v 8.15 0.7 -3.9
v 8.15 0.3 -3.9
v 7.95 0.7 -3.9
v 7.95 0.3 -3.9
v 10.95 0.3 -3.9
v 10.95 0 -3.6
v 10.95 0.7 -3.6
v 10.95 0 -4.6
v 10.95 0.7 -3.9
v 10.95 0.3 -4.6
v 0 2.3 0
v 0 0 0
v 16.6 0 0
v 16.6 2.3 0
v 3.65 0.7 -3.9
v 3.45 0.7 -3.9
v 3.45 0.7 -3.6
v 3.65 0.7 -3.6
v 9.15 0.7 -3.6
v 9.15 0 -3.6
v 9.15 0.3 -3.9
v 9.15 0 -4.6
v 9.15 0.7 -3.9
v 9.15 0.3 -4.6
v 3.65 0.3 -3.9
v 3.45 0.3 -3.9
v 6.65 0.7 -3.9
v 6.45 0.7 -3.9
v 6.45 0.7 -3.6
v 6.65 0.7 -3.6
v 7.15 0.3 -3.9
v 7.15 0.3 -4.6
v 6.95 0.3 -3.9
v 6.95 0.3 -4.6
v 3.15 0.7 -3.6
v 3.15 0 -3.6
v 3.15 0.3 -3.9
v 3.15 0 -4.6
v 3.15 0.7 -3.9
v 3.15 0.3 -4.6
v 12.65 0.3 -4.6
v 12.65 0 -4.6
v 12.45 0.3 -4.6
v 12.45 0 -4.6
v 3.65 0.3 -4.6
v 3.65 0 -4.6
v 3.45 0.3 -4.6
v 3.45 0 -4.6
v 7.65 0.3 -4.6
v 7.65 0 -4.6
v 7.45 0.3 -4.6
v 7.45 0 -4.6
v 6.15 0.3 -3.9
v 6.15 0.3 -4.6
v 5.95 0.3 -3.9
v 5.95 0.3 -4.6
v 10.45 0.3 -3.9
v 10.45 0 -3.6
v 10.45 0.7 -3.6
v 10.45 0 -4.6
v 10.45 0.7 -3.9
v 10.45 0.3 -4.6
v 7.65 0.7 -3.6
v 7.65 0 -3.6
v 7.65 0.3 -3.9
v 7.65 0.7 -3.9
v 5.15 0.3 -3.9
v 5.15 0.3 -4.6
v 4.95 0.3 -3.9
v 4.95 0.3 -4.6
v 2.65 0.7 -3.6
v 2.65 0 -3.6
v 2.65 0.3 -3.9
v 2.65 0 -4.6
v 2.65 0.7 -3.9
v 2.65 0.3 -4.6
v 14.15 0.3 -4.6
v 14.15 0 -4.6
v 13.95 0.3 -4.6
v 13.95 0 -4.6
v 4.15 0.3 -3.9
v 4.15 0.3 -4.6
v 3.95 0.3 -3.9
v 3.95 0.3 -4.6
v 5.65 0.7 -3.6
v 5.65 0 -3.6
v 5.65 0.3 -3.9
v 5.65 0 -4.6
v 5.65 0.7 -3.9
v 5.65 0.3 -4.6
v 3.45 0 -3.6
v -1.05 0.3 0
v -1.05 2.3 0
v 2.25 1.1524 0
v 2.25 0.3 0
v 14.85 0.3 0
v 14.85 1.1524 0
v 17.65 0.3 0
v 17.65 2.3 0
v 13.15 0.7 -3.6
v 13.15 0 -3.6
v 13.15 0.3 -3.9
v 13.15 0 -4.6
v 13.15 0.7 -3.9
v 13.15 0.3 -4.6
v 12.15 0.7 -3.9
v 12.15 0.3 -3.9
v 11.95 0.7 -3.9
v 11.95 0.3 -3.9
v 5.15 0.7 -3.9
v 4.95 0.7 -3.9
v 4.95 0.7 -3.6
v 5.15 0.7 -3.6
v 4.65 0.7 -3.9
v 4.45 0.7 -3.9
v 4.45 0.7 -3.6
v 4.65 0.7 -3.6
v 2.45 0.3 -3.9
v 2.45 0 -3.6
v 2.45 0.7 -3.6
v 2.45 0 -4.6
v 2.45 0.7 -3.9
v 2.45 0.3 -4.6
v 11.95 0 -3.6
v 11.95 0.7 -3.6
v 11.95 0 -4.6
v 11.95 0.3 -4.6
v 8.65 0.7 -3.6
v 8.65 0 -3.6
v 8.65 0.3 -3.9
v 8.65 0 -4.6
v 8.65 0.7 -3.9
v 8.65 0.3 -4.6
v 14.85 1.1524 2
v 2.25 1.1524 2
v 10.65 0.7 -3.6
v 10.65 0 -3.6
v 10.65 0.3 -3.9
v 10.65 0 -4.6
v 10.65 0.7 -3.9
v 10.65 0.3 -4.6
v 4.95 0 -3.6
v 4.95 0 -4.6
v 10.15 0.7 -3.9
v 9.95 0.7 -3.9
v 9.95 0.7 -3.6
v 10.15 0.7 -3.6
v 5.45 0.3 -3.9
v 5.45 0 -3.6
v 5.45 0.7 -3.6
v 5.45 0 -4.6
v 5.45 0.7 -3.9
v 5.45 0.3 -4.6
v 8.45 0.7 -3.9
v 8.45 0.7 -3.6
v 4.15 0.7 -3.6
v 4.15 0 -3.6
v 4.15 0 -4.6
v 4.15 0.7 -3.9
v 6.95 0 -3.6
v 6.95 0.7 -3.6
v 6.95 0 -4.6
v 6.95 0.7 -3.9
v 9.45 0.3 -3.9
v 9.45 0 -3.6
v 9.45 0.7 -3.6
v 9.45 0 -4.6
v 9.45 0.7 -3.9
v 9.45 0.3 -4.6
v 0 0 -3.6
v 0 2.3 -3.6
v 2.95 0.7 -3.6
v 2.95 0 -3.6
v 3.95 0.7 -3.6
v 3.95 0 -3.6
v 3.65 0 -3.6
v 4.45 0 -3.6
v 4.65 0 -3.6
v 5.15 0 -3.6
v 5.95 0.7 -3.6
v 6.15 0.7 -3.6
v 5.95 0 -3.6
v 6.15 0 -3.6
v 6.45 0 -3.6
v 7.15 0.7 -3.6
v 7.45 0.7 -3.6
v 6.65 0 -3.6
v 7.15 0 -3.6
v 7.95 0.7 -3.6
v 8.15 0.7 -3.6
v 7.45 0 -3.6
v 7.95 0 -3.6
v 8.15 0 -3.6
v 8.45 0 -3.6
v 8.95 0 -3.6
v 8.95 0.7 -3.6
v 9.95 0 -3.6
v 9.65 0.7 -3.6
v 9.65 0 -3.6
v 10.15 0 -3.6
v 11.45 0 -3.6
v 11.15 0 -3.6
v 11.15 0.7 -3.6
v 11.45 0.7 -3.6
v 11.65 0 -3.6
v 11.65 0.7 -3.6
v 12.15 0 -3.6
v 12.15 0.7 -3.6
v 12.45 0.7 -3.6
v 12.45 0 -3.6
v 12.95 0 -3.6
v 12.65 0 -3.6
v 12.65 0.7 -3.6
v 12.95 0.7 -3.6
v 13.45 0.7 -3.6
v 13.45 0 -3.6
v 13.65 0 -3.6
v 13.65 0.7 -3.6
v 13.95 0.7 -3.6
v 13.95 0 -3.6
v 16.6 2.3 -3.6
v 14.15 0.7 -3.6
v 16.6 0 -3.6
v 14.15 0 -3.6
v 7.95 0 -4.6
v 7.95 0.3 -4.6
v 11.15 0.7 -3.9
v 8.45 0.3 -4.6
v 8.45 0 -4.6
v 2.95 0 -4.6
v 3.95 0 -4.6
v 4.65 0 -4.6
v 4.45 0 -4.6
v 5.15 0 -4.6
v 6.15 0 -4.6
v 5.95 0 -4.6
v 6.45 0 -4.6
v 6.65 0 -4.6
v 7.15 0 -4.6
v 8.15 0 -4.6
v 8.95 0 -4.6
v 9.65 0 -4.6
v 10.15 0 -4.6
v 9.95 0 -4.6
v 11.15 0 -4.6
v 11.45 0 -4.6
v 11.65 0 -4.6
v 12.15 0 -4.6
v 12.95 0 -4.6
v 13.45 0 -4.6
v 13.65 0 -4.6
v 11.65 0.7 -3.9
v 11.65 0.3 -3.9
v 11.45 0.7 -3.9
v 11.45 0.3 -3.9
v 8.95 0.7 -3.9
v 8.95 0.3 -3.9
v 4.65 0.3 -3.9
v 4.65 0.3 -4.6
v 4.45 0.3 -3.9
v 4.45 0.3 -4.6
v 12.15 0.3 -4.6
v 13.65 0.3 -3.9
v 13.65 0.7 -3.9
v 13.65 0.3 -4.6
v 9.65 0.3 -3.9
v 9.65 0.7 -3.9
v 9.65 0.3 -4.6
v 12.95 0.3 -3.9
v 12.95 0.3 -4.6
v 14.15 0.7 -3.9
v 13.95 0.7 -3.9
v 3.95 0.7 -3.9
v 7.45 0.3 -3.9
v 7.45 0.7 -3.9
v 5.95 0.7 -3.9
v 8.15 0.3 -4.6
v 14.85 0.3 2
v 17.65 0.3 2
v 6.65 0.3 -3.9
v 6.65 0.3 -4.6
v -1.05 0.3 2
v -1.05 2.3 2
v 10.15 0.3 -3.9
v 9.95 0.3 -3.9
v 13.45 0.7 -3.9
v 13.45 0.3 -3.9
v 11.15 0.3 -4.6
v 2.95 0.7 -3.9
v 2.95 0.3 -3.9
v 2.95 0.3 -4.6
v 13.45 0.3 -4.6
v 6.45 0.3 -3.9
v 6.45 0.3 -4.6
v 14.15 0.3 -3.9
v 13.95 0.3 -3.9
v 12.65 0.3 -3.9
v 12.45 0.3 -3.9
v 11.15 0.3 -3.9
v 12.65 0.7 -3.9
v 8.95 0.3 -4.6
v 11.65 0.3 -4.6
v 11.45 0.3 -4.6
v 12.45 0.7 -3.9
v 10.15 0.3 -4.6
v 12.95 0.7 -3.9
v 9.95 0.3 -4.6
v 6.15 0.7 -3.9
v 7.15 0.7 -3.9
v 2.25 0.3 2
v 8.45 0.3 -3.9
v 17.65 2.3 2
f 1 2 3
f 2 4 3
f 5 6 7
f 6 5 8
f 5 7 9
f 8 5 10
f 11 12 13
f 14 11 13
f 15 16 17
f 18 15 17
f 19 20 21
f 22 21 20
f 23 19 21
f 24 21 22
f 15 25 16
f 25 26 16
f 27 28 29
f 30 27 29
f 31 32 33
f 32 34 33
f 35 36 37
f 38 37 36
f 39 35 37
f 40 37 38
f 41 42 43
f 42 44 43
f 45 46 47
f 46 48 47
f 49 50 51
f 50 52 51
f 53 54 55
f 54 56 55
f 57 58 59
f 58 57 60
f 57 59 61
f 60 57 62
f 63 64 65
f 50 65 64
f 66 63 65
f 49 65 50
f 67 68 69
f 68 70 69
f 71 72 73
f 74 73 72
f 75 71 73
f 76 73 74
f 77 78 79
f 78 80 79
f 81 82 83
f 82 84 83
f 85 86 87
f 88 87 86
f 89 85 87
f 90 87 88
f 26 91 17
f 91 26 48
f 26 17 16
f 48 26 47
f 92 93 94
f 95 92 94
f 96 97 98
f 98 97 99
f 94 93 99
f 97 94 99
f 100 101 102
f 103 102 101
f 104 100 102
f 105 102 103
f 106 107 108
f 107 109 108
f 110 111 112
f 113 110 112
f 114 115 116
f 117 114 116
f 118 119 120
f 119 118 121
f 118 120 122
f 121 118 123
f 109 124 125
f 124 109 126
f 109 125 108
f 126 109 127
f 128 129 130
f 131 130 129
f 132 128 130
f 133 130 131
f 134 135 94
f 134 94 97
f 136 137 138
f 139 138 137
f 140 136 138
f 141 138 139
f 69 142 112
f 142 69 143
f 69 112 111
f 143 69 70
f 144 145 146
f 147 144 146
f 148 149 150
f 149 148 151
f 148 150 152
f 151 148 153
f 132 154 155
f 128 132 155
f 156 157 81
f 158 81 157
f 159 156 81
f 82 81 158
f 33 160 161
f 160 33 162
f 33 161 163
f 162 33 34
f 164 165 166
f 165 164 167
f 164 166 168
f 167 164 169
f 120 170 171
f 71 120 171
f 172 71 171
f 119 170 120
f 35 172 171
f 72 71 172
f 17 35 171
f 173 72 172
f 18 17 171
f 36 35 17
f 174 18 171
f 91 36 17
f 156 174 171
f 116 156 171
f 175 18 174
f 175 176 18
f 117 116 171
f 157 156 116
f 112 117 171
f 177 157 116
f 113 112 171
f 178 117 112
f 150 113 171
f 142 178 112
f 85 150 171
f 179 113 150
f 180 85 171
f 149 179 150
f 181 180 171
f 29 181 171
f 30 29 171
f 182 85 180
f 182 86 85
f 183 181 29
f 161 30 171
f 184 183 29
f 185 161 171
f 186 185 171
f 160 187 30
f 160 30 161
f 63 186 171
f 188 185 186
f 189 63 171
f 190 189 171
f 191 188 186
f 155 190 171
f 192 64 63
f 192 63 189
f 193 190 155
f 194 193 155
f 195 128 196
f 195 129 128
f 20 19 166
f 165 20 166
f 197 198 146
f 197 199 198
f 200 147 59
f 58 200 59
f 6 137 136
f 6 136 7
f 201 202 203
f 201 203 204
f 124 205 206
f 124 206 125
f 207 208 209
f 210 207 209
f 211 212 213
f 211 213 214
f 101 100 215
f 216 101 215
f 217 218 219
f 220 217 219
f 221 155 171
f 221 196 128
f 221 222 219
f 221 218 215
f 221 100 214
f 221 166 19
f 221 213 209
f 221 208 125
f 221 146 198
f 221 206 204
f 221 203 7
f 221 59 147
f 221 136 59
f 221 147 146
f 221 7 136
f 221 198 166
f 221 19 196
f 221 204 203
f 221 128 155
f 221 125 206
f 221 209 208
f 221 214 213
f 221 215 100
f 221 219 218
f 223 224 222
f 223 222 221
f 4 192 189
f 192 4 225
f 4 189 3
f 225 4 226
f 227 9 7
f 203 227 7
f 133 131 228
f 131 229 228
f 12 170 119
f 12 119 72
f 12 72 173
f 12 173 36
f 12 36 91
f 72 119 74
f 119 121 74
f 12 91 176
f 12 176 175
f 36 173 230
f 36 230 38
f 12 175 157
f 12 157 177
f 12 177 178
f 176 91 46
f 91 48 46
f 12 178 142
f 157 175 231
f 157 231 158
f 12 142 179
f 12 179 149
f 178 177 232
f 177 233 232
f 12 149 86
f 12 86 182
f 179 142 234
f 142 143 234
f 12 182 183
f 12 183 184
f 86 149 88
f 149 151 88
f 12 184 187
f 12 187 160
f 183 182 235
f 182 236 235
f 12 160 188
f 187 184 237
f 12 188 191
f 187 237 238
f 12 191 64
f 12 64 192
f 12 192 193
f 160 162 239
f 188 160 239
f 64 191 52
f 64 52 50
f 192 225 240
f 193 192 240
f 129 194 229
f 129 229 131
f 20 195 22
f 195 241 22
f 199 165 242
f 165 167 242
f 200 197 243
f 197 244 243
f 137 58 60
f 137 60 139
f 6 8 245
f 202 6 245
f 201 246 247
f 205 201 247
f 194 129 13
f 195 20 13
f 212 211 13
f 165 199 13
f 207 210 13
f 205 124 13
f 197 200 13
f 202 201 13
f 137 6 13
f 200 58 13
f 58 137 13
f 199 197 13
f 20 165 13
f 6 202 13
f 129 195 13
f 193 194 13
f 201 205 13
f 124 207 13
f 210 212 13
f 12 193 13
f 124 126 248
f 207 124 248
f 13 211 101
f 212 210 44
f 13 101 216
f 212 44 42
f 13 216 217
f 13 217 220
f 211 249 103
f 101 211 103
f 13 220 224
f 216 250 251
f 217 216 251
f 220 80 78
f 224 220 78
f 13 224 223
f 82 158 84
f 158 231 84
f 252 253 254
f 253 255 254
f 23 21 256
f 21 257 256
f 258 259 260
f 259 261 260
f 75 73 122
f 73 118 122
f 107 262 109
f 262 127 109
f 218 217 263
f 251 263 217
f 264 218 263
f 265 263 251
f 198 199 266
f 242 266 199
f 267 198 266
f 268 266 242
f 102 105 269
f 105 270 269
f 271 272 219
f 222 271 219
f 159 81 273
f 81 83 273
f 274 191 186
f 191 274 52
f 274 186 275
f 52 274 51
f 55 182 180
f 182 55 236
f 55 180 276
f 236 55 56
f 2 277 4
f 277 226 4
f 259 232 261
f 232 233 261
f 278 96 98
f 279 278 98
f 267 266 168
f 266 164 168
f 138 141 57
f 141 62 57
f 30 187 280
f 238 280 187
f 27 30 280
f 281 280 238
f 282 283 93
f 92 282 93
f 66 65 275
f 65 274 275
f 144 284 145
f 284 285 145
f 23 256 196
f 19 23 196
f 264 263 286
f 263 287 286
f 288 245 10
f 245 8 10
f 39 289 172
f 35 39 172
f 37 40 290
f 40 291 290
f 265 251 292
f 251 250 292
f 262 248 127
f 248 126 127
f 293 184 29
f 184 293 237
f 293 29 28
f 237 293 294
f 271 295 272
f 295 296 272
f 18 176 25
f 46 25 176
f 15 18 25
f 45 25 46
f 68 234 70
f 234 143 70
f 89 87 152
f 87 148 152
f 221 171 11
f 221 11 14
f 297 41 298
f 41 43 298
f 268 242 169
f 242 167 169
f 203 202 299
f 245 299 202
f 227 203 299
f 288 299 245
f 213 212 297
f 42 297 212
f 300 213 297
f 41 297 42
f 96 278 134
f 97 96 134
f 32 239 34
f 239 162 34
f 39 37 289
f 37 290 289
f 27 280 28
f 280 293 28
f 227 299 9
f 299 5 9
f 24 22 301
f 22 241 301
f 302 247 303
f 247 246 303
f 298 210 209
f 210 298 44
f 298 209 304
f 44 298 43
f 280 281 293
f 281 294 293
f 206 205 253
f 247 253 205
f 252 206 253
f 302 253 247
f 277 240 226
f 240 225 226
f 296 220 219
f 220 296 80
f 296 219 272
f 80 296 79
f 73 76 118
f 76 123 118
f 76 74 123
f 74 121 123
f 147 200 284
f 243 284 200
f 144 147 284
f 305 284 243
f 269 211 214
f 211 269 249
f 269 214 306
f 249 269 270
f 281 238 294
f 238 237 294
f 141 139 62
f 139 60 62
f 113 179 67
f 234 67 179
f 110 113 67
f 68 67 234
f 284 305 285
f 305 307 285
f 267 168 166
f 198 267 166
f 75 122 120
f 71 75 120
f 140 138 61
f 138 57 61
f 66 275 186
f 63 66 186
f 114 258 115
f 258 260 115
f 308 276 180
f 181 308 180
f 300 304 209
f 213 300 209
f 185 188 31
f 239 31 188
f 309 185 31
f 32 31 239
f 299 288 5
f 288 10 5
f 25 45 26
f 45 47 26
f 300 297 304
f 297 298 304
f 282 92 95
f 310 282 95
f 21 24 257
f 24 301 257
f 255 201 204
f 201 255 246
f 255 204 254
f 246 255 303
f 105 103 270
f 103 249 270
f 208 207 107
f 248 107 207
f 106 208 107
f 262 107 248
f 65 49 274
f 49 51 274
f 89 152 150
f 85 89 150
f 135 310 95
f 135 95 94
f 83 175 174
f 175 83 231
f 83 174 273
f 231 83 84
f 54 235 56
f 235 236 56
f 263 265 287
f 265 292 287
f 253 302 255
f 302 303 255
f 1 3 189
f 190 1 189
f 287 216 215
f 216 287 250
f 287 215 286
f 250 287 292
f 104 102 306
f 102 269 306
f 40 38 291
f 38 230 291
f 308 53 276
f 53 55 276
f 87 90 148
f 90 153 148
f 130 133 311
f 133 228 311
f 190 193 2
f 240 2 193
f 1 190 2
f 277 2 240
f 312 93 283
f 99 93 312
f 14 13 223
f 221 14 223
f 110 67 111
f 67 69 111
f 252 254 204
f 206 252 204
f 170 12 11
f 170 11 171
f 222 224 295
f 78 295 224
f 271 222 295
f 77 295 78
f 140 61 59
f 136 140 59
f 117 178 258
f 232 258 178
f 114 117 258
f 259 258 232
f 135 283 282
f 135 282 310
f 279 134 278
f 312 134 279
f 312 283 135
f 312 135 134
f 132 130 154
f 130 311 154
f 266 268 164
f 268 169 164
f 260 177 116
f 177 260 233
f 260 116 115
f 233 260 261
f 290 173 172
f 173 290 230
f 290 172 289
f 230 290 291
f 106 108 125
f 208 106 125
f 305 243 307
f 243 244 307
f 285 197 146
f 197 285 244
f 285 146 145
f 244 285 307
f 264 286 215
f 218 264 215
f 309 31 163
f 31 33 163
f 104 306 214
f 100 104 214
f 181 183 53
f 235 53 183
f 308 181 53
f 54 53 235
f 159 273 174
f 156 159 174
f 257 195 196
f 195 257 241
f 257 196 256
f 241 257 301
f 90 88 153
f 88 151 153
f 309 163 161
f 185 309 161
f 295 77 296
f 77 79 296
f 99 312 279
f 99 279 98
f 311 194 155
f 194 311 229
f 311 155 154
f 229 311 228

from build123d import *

# Parameters (mm, degrees)
SKETCH1_W           = 16.6
SKETCH1_H           = 3.6
BOSS_EXTRUDE1_DEPTH = 2.3
SKETCH2_W           = 18.7
SKETCH2_H           = 2
BOSS_EXTRUDE2_DEPTH = 2
BOSS_EXTRUDE5_DEPTH = 0.1
LPATTERN2_COUNT     = 24
LPATTERN2_PITCH     = 0.5
SKETCH4_W           = 12.6
SKETCH4_H           = 0.85237051
CUT_EXTRUDE2_DEPTH  = 2


with BuildPart() as part:
    # Sketch1 → Boss-Extrude1 (new body)
    with BuildSketch(Plane(origin=(0, 0, 0), x_dir=(1, 0, 0), z_dir=(0, 1, 0))):
        with Locations((8.3, 1.8)):
            Rectangle(SKETCH1_W, SKETCH1_H)
    extrude(amount=BOSS_EXTRUDE1_DEPTH)

    # Sketch3 → Boss-Extrude5 (add, symmetric)
    with BuildSketch(Plane.ZY.offset(-2.55)):
        Polygon((-3.6, 0), (-4.6, 0), (-4.6, 0.3), (-3.9, 0.3), (-3.9, 0.7), (-3.6, 0.7), align=None)
    boss_extrude5 = extrude(amount=BOSS_EXTRUDE5_DEPTH, both=True)

    # LPattern2: Boss-Extrude5 ×24
    with Locations(*[(i * LPATTERN2_PITCH, 0, 0) for i in range(1, LPATTERN2_COUNT)]):
        add(boss_extrude5)


with BuildPart() as body_2:
    # Sketch2 → Boss-Extrude2 (new body)
    with BuildSketch(Plane(origin=(0, 2.3, 0), x_dir=(1, 0, 0), z_dir=(0, 1, 0))):
        with Locations((8.3, -1)):
            Rectangle(SKETCH2_W, SKETCH2_H)
    extrude(amount=-BOSS_EXTRUDE2_DEPTH)

    # Sketch4 → Cut-Extrude2 (cut)
    with BuildSketch(Plane.XY.offset(2)):
        with Locations((8.55, 0.726185255)):
            Rectangle(SKETCH4_W, SKETCH4_H)
    extrude(amount=-CUT_EXTRUDE2_DEPTH, mode=Mode.SUBTRACT)


solid = Compound([part.part, body_2.part])
